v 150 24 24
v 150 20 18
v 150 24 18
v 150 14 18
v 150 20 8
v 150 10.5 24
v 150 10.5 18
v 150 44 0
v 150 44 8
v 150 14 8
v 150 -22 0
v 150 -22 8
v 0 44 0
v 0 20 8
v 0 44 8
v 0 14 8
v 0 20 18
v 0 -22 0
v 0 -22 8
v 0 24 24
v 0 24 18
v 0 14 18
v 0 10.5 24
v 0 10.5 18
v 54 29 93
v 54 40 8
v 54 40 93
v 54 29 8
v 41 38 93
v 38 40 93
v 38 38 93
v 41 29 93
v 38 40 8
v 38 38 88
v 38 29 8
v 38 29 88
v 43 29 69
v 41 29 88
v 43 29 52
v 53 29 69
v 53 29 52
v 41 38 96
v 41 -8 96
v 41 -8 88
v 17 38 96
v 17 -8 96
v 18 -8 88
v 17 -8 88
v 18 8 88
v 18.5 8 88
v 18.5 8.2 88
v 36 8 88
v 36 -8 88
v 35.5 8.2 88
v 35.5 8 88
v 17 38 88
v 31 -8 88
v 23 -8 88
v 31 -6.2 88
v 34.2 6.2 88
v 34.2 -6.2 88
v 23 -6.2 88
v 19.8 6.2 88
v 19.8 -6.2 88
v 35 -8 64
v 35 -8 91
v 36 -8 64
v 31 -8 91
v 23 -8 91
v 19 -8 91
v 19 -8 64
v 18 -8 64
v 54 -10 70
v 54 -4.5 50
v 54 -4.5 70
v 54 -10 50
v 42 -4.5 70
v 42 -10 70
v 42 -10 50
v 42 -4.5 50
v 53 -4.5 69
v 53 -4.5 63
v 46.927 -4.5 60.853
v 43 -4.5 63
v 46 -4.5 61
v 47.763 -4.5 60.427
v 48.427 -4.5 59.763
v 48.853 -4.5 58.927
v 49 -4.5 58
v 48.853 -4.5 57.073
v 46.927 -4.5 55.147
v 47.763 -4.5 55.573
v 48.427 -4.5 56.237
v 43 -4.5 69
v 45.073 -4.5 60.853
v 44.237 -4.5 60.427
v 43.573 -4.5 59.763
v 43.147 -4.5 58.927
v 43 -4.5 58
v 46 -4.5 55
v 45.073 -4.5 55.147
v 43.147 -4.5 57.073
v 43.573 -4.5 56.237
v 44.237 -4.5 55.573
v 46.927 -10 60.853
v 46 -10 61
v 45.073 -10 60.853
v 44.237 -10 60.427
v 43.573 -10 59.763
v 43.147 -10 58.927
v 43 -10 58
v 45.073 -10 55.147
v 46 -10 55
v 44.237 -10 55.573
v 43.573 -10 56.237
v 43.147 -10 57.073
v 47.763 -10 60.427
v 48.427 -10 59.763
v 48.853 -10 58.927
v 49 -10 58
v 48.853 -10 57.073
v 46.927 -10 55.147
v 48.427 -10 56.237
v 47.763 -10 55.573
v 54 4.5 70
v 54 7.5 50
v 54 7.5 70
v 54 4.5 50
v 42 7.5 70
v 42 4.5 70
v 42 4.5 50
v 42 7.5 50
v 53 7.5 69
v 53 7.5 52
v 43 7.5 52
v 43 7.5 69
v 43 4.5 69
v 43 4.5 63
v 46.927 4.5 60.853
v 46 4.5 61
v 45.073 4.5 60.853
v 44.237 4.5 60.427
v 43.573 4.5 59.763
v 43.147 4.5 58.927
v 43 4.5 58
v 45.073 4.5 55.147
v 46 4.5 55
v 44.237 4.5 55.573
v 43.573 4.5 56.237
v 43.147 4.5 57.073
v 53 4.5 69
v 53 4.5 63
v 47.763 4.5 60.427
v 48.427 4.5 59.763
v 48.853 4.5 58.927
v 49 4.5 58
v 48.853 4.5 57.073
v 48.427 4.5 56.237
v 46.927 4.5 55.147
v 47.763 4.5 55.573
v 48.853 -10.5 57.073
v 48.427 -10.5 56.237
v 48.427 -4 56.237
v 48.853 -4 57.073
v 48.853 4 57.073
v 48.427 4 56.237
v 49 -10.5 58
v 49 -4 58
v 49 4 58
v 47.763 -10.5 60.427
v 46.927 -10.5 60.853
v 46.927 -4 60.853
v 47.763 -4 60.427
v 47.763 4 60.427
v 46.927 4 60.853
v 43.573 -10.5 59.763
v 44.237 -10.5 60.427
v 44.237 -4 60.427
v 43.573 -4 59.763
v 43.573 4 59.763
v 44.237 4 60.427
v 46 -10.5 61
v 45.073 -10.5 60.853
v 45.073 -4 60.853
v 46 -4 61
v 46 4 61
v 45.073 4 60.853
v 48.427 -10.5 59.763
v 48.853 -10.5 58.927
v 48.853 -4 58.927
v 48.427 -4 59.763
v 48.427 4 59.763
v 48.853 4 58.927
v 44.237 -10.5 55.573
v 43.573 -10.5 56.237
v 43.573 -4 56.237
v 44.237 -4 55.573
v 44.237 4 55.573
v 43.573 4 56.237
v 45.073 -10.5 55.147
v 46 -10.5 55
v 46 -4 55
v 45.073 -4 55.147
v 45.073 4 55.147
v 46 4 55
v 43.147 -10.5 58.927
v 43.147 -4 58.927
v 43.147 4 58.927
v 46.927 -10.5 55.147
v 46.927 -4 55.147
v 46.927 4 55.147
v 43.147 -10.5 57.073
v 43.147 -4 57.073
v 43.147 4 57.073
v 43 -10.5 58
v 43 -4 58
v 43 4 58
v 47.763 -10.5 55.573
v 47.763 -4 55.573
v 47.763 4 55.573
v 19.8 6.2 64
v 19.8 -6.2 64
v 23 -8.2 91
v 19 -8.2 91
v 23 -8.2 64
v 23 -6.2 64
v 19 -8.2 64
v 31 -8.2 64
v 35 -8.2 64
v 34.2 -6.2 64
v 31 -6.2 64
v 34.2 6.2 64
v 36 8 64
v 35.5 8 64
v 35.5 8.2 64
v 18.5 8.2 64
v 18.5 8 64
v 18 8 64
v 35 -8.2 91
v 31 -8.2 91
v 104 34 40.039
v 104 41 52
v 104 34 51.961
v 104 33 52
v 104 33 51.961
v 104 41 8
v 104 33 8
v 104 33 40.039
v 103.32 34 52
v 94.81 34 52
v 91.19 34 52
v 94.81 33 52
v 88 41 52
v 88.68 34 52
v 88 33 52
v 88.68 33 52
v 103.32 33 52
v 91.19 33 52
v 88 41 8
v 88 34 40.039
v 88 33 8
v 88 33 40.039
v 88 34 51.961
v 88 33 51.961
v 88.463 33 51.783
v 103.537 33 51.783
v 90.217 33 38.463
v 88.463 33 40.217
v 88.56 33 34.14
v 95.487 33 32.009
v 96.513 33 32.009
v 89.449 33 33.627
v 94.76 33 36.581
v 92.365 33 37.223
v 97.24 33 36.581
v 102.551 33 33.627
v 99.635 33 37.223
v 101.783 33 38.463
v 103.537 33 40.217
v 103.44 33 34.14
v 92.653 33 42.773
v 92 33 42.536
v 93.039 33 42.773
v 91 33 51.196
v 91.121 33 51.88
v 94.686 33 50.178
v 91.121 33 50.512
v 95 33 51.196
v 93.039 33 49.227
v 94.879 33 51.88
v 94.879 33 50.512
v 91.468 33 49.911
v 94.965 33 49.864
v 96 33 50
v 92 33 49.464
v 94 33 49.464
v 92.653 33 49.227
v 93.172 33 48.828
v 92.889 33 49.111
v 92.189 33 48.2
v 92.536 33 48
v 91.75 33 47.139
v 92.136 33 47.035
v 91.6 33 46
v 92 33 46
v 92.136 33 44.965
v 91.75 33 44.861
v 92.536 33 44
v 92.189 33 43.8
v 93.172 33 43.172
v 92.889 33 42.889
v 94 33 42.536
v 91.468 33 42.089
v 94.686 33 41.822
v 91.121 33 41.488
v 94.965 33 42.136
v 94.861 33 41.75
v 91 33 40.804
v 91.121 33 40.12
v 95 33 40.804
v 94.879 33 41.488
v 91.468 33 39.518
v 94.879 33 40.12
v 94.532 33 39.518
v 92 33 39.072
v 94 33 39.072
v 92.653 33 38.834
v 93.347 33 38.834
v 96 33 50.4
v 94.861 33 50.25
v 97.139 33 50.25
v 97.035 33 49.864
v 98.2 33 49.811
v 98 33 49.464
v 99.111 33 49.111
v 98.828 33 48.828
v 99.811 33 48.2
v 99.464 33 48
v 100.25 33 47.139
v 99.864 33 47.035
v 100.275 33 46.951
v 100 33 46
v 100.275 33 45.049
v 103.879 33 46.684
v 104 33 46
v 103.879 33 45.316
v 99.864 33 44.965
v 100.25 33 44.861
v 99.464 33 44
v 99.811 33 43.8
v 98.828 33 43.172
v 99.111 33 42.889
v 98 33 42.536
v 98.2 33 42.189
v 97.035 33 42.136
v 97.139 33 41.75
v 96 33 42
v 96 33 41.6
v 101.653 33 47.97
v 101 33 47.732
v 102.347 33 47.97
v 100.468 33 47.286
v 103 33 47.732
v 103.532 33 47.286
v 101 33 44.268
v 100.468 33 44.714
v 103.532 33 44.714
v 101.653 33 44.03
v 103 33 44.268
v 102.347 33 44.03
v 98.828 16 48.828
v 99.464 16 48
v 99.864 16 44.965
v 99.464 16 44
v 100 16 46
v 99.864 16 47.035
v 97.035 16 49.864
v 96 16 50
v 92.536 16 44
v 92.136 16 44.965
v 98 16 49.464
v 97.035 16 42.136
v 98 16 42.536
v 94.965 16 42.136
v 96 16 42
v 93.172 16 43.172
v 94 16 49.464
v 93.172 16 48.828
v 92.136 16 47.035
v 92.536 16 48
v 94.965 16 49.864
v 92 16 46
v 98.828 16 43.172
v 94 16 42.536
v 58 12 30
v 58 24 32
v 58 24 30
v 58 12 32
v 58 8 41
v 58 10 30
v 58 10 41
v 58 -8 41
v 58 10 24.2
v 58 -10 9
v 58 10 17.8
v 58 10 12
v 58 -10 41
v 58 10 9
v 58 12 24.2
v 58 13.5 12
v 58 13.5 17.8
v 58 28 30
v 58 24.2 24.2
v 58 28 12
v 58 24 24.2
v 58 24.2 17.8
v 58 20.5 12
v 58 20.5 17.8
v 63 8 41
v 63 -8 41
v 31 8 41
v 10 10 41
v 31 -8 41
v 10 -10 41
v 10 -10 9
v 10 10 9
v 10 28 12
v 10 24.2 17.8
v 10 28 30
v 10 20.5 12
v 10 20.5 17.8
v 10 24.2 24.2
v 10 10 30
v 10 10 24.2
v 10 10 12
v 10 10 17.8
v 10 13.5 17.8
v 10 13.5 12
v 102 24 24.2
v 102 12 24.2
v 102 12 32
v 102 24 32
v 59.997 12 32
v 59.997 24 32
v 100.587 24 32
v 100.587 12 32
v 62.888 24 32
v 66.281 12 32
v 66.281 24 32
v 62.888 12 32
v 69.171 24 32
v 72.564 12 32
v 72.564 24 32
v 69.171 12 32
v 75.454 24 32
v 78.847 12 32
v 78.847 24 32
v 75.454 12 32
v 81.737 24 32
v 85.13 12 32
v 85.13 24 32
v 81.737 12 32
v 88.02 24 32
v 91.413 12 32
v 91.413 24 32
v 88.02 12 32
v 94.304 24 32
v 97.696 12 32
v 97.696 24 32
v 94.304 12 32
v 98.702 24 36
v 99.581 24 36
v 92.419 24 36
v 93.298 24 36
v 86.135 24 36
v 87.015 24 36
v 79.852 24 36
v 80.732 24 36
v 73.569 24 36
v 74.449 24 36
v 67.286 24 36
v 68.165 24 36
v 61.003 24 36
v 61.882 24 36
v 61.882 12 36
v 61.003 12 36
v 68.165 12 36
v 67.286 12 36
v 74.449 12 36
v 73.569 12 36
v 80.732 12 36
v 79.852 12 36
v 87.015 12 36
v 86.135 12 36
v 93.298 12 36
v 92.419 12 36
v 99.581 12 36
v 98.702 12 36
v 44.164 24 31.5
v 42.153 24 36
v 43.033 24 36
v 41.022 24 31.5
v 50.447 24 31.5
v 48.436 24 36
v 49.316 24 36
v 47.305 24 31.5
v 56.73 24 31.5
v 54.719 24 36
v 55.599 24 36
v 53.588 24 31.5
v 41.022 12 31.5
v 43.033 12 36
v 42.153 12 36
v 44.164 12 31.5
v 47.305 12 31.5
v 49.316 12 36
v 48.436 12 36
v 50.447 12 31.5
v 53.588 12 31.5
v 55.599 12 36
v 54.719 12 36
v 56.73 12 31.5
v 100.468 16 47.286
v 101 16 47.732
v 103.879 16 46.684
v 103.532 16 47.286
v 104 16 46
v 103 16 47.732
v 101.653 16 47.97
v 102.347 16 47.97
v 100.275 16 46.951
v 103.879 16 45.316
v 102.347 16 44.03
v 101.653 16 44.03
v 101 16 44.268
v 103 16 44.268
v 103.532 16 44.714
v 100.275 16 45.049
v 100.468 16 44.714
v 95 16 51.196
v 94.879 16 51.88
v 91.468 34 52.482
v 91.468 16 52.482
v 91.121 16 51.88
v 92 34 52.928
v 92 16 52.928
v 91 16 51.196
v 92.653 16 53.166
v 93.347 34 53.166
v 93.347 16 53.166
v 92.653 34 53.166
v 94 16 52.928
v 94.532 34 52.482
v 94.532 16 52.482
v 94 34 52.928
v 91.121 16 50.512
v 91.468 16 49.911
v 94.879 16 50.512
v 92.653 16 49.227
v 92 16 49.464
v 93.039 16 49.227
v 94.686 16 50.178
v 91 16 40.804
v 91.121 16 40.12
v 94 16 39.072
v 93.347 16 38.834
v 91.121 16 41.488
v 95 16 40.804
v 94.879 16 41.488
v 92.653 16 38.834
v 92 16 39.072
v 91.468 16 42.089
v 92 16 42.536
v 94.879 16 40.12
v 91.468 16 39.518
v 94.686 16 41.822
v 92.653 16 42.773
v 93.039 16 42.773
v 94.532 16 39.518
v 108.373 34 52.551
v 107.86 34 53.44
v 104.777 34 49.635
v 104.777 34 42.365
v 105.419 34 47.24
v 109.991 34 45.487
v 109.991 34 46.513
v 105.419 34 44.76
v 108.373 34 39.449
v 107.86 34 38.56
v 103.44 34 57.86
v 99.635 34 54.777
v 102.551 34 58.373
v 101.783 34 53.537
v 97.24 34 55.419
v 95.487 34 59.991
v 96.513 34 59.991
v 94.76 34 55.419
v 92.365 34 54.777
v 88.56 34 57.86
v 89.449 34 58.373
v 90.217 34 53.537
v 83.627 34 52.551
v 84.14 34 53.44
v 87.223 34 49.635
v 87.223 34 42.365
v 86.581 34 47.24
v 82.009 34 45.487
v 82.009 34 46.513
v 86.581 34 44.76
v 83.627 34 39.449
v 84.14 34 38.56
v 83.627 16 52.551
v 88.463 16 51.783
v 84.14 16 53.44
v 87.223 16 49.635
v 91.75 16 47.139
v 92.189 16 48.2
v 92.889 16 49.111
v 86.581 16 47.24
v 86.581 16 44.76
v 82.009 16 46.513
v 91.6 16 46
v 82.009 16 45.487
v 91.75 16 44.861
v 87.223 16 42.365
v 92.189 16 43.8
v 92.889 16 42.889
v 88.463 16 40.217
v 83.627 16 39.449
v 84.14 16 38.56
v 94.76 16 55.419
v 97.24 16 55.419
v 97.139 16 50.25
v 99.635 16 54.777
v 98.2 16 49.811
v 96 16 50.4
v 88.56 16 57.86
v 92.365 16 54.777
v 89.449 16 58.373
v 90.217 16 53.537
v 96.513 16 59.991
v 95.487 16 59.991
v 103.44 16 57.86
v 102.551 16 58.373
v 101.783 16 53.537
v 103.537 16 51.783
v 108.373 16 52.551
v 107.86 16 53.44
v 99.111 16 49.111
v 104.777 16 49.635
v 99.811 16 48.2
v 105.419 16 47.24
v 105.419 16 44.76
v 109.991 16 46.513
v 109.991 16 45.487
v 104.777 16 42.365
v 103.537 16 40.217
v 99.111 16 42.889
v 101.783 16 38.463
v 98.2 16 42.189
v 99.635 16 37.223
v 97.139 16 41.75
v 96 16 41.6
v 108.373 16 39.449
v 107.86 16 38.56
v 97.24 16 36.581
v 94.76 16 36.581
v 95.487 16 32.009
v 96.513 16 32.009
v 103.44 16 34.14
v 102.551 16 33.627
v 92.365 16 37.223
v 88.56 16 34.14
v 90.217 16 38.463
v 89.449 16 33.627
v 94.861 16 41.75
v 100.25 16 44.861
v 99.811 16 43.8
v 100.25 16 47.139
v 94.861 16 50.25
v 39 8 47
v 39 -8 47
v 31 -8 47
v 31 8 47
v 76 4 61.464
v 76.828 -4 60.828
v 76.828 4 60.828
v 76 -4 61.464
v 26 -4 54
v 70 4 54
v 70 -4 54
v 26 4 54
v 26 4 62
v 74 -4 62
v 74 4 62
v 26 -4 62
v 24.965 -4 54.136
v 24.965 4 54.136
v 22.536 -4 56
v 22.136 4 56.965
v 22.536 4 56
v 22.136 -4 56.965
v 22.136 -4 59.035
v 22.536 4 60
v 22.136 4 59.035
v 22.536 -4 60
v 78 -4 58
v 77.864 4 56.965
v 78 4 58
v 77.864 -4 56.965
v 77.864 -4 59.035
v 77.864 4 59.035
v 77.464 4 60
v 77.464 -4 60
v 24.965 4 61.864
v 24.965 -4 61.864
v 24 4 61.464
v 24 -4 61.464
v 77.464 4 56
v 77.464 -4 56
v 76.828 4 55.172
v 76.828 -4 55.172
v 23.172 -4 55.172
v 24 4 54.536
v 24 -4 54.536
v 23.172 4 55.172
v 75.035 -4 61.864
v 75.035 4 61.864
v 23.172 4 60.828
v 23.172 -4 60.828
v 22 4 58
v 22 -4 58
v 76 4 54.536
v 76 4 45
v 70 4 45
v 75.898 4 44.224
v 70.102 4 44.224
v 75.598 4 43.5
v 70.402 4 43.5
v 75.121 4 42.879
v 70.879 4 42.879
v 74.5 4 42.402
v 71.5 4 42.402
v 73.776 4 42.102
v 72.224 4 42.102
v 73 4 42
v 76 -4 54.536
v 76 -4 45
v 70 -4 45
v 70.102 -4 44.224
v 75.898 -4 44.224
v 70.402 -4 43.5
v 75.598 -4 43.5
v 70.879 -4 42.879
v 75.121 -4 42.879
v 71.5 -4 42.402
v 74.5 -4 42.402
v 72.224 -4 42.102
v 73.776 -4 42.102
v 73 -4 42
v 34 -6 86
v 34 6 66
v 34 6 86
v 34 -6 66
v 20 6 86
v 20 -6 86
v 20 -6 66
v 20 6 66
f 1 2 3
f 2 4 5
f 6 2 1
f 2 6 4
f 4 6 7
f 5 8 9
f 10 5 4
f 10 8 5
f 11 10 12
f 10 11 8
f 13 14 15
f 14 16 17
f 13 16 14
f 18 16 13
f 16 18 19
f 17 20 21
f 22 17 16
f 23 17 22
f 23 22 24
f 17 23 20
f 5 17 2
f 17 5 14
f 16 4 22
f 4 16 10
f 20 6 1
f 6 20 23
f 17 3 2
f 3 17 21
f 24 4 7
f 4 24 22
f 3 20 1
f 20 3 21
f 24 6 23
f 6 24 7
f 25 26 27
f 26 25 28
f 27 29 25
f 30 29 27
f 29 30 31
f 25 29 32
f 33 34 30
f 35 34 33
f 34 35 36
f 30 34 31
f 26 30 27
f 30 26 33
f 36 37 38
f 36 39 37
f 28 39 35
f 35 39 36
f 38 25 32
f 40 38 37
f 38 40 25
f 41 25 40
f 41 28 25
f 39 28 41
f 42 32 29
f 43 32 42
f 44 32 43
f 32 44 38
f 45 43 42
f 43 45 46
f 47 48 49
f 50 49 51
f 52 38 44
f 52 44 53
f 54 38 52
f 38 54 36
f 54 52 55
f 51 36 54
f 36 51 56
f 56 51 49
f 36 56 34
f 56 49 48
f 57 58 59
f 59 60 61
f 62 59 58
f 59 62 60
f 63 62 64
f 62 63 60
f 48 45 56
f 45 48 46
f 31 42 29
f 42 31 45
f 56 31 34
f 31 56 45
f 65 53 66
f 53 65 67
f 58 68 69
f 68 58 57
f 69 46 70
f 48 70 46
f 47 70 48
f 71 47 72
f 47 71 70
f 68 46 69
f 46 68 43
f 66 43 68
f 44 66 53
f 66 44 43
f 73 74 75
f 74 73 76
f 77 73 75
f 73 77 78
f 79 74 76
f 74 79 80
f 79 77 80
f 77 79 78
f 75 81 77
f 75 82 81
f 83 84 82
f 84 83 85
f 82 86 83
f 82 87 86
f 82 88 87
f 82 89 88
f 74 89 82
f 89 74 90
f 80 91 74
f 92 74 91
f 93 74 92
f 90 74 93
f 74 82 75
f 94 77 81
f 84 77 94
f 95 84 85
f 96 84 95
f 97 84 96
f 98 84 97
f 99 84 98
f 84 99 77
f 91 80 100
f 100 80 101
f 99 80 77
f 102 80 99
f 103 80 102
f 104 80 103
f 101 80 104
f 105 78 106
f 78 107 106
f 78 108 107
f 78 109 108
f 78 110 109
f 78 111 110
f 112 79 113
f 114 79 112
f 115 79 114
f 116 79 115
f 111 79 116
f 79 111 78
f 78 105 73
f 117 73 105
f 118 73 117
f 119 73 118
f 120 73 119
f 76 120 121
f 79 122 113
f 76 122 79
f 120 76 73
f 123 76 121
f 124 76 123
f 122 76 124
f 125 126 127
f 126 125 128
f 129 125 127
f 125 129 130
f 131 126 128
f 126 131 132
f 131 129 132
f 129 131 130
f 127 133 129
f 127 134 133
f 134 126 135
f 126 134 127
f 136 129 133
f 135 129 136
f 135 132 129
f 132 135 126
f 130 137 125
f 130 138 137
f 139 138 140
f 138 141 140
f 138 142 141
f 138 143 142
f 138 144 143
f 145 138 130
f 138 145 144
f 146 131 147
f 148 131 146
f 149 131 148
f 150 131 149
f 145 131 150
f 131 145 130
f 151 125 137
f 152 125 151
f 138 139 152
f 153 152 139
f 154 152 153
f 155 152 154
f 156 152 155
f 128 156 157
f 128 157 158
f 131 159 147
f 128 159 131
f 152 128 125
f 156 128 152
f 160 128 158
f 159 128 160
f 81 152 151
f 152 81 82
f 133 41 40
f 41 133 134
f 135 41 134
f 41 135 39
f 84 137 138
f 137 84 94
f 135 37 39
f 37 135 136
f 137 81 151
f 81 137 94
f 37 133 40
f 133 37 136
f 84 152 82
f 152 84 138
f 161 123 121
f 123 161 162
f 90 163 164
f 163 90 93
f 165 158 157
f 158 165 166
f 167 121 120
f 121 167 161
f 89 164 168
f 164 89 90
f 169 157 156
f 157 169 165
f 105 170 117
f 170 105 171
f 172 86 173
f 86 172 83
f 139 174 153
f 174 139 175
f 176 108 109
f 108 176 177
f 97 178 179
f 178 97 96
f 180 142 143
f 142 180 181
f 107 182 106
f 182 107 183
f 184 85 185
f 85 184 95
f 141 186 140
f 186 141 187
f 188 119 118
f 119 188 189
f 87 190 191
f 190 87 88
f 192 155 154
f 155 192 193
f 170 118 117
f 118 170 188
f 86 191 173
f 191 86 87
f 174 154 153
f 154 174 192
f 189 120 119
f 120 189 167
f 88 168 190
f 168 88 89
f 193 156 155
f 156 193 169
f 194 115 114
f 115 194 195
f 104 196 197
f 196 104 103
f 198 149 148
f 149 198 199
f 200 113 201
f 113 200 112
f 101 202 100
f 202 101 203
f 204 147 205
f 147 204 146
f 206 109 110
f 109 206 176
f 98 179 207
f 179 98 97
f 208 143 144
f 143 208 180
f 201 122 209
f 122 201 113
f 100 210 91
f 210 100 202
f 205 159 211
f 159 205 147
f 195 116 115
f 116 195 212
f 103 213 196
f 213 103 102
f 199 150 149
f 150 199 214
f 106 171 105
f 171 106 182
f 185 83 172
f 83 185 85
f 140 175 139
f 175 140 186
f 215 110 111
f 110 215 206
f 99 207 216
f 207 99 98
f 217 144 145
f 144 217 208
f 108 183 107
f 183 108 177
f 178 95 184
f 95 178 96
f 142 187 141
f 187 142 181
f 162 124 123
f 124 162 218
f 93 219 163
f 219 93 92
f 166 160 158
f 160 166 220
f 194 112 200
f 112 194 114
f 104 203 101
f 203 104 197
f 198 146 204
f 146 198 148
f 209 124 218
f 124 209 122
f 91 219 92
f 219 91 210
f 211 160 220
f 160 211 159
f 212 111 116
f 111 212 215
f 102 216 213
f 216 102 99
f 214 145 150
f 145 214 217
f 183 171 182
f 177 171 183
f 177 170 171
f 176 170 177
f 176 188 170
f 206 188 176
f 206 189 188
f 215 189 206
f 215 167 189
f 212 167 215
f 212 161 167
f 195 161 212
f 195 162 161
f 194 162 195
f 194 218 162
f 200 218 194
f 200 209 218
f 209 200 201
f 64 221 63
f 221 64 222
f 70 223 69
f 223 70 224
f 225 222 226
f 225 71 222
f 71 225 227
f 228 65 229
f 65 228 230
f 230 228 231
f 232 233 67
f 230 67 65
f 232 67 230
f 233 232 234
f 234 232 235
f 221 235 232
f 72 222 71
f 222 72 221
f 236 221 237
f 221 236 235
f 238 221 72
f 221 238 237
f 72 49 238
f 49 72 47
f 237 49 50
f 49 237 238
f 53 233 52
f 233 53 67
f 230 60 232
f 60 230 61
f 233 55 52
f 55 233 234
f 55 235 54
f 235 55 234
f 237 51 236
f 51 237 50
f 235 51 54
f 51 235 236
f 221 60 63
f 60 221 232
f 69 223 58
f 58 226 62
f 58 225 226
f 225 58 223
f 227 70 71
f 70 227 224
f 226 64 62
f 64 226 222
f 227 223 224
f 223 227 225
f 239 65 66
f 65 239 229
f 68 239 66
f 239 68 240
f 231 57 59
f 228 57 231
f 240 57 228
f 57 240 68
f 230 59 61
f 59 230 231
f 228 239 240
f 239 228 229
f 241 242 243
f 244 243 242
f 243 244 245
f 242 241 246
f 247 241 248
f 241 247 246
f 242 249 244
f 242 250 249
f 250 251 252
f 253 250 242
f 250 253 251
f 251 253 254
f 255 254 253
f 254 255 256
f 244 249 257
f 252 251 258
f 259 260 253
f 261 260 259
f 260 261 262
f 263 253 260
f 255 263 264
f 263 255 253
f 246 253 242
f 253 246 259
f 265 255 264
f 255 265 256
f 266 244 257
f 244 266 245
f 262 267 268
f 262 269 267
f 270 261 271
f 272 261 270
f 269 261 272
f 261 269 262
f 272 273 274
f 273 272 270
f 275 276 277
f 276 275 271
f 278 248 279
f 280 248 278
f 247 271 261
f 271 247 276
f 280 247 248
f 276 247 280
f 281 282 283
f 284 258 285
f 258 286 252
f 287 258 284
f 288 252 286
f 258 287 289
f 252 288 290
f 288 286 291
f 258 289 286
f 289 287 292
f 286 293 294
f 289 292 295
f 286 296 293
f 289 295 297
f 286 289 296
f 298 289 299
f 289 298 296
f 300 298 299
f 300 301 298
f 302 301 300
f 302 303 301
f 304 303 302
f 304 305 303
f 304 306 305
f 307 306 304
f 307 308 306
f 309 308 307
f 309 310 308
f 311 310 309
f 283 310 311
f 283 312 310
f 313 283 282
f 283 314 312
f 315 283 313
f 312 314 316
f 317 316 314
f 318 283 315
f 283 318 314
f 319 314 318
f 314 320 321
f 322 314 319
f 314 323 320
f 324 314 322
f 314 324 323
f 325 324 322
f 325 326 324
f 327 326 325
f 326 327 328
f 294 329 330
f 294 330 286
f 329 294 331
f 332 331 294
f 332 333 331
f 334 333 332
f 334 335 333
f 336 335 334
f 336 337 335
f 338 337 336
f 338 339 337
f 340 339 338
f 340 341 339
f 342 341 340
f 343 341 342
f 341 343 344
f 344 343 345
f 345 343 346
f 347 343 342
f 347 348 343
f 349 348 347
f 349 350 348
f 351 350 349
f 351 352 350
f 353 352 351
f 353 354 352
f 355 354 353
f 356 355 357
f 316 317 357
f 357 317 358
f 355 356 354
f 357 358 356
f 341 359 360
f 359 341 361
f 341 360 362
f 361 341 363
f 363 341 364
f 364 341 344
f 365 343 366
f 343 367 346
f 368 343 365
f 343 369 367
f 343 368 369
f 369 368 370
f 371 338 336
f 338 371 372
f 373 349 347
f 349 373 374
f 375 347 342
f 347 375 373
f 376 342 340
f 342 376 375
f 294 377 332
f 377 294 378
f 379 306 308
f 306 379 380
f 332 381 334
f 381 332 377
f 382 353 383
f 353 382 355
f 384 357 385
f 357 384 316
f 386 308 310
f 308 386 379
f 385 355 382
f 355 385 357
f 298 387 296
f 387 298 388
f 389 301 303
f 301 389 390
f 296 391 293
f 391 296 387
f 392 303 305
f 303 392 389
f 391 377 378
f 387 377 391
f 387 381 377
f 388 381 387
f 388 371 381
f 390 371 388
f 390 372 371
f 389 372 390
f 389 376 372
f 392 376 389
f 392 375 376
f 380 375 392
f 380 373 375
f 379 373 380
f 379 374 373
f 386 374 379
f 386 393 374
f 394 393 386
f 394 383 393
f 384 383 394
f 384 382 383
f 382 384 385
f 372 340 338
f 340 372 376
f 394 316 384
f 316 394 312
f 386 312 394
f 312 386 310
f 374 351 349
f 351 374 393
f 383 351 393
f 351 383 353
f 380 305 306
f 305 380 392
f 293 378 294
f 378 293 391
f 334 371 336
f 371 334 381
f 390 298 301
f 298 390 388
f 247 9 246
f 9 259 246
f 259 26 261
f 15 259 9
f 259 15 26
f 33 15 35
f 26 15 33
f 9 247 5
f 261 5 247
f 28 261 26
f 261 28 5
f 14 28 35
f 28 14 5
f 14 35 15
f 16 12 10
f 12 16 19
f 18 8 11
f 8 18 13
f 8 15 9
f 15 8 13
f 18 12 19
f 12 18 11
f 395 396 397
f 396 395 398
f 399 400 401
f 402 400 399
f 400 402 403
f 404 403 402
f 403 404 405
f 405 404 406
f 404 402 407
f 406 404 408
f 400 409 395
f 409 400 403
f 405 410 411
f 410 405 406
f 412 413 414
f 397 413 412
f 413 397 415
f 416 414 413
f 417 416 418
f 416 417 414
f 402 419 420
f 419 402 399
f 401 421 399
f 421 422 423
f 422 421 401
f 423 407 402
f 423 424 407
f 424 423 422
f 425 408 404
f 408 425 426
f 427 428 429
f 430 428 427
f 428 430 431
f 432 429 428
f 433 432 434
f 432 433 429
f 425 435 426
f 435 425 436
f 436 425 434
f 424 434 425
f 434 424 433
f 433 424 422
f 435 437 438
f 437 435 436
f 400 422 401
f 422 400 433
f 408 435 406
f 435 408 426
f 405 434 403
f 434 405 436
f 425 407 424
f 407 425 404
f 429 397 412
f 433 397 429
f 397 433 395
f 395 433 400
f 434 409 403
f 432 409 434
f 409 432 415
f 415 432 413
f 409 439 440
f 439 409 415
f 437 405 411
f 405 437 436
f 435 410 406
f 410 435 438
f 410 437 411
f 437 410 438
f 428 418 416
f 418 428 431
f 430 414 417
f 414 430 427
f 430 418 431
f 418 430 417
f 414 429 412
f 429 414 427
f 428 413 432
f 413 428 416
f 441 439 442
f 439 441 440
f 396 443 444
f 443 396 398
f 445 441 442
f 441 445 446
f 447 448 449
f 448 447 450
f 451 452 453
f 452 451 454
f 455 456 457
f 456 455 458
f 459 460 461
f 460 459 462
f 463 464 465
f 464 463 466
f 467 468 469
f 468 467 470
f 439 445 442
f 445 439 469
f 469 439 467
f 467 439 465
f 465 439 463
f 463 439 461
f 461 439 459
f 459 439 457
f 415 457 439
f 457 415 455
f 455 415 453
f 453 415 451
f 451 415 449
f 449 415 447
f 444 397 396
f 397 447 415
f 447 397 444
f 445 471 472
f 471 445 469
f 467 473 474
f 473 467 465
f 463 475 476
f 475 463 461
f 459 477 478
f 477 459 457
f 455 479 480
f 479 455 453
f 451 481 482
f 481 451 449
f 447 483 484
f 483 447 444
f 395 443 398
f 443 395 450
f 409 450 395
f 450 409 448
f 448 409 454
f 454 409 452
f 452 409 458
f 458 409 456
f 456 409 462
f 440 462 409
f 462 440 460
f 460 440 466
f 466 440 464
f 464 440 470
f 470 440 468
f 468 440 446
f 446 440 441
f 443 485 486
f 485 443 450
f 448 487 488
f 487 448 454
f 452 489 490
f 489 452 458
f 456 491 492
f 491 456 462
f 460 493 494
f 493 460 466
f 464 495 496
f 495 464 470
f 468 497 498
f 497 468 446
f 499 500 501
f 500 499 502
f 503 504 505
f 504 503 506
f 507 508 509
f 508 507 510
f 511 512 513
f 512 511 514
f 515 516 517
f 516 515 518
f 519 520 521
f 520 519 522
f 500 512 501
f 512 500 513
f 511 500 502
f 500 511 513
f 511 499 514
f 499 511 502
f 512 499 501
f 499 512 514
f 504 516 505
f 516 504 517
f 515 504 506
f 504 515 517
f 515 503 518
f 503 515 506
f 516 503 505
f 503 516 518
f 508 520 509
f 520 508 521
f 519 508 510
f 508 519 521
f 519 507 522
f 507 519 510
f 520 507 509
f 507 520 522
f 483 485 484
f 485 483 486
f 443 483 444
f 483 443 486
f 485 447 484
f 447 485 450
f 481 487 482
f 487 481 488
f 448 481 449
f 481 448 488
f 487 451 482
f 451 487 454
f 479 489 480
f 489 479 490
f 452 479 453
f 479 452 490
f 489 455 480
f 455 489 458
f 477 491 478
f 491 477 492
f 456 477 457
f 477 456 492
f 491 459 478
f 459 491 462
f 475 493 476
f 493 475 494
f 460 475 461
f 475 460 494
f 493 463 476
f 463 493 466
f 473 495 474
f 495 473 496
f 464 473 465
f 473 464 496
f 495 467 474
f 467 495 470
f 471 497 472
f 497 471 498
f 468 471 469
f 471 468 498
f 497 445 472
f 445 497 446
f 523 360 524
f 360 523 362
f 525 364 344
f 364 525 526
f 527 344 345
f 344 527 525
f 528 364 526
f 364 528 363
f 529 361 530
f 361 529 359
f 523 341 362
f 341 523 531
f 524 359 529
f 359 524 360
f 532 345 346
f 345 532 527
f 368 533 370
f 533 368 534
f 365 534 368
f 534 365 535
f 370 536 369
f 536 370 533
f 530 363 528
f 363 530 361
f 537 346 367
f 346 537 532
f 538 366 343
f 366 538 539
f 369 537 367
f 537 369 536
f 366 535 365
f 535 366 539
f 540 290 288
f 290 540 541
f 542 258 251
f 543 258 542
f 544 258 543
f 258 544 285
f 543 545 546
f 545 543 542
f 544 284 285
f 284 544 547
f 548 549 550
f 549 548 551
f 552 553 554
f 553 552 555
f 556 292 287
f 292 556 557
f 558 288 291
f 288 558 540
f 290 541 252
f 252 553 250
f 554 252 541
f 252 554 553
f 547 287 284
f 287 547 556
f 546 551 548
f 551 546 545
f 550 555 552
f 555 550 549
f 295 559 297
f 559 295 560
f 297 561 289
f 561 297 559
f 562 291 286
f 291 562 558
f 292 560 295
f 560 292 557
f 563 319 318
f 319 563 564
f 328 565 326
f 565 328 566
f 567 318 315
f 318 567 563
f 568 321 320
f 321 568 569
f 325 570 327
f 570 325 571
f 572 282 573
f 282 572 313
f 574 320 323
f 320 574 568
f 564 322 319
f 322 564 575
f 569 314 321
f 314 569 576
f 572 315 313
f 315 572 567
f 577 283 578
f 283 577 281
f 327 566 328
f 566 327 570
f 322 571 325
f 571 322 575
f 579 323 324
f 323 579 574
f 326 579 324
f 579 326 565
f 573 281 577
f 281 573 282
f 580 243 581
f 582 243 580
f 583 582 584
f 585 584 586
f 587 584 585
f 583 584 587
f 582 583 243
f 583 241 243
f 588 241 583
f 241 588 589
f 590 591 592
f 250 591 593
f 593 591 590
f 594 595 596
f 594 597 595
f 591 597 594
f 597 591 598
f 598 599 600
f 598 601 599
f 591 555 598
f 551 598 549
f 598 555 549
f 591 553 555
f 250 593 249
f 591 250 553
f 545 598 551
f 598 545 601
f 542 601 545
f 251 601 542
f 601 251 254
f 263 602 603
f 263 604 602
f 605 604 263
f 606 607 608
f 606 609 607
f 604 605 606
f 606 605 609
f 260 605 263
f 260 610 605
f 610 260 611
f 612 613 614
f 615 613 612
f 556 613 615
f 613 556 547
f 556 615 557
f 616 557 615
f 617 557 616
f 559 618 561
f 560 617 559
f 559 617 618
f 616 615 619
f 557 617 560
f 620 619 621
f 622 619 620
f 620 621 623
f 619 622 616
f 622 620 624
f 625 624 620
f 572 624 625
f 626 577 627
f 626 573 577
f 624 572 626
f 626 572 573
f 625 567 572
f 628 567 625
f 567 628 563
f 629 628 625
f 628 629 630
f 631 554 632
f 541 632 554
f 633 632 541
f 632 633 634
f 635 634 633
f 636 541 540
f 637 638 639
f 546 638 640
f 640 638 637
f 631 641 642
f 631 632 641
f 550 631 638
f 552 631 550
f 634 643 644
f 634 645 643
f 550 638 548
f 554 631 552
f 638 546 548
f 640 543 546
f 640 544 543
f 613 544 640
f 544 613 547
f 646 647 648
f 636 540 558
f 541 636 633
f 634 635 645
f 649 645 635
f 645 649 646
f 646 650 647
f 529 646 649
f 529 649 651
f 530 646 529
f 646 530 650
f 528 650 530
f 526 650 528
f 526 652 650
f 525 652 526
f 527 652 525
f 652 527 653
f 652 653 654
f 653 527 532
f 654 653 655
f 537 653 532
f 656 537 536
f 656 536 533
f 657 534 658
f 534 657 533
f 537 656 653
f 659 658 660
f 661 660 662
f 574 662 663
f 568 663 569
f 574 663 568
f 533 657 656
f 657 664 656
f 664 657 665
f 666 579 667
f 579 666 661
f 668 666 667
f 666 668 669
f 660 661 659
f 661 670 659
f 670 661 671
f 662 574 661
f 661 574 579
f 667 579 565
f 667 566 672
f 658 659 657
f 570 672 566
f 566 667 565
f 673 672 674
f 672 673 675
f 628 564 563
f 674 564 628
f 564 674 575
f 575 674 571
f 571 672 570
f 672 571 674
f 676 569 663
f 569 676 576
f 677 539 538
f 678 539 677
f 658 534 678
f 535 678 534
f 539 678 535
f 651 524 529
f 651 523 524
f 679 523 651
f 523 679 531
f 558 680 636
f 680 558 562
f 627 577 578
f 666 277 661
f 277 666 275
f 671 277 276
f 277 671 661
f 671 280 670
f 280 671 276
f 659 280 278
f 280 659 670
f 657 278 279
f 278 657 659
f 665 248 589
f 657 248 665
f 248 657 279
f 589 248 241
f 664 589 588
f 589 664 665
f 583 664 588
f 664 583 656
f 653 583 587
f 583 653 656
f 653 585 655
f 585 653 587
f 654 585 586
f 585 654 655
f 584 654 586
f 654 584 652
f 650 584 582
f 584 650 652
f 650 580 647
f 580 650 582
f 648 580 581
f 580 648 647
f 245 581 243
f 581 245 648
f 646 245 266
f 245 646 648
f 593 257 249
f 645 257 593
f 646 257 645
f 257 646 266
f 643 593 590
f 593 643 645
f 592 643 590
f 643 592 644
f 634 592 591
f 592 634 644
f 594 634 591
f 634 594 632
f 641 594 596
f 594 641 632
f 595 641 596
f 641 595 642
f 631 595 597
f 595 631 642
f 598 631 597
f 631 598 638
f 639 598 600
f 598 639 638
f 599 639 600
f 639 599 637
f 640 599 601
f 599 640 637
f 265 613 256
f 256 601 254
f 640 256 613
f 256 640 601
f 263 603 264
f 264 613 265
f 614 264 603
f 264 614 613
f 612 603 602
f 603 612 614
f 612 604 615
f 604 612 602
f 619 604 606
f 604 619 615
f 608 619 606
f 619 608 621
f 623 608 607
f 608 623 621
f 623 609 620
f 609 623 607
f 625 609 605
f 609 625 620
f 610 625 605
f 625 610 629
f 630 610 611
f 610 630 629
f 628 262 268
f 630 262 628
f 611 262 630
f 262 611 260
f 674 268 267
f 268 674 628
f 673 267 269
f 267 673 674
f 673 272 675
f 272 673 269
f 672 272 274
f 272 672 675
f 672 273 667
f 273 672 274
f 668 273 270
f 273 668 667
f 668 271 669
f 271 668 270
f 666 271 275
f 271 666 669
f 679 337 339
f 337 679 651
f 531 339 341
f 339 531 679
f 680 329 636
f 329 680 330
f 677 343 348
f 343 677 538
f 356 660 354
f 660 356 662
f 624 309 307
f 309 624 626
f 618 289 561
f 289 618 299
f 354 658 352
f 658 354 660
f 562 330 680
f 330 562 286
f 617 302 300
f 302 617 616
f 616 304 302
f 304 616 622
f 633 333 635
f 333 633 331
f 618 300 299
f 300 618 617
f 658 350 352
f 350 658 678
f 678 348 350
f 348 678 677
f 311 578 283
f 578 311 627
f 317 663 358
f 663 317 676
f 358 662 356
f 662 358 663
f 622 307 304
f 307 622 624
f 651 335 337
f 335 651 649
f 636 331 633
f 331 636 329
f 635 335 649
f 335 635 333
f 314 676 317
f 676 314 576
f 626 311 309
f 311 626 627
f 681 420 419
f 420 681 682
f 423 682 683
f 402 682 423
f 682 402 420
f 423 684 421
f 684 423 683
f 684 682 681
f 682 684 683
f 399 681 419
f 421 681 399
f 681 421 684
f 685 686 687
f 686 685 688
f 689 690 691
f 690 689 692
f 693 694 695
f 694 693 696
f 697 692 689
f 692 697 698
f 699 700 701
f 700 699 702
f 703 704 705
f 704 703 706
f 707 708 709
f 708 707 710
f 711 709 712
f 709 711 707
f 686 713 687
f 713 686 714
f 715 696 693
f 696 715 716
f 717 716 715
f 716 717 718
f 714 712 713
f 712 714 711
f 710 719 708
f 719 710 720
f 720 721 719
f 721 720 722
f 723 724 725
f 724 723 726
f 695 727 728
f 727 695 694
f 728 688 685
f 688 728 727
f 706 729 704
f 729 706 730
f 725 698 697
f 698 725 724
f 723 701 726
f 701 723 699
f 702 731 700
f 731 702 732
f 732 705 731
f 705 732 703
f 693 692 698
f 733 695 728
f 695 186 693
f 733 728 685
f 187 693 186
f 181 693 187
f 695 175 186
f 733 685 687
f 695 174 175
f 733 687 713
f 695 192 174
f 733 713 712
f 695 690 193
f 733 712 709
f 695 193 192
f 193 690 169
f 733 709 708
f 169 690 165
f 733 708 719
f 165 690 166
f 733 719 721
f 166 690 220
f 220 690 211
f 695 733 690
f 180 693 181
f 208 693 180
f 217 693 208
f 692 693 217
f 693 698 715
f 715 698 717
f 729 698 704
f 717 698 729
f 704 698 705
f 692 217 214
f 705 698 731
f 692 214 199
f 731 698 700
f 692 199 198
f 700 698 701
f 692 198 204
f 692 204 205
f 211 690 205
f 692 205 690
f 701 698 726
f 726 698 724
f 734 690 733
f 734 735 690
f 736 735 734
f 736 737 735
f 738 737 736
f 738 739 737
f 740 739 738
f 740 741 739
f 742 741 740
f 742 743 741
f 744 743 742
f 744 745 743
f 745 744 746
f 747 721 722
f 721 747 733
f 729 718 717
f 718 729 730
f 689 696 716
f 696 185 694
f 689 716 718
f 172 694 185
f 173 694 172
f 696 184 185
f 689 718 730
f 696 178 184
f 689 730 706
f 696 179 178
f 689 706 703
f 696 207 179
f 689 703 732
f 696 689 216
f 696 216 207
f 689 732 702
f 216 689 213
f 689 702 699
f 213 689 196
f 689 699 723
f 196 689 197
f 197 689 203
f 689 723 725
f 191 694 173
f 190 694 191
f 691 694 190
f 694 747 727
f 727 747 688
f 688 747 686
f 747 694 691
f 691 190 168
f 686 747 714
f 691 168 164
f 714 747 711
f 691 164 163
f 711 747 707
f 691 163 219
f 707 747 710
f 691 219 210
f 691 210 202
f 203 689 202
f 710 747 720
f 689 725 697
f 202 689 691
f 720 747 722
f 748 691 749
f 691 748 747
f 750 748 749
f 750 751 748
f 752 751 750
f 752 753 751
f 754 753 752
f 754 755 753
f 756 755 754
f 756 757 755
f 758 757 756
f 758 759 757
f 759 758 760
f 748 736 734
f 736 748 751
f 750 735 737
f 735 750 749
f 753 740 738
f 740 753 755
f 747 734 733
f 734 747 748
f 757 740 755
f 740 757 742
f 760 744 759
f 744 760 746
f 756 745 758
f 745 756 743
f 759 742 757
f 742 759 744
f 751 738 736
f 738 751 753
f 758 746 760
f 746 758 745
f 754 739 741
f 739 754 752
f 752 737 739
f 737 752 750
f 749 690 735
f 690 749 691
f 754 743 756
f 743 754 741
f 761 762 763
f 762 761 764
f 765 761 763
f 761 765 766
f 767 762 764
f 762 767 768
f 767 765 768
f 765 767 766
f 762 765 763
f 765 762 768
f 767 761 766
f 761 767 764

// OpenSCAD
// A gate, a spring latch, and a drive that cannot open it.
//
// This is the whole argument in one model. The gate is driven to a position by
// a servo with a force ceiling, four times over: shut it, open it, give up,
// and — once the latch has been released — open it. The second of those is the
// interesting one. Nothing here says "the gate is locked". The hook drops
// behind the catch because it is heavy and sprung, the catch runs into it
// because it is in the way, and the drive fails to reach the number it was
// given because a bounded force cannot beat a hinge stop.
//
// A drive that could always reach its target would teleport the gate through
// the hook, and the animation would look fine and be a lie.
//
// The pawl is two parts bolted together rather than one, and the reason is the
// collider. Drawn as a single L, its convex hull is the *triangle* between the
// arm and the hook — which fills in exactly the gap the catch has to pass
// through, and the check duly reported it fouling before anything moved. An arm
// and a hook are each convex on their own. `collider = "decompose"` would also
// work and costs a voxel of accuracy; two parts and a weld cost nothing.
//
// Also here: a rack and pinion used as a *readout*, the gate turning the pinion
// rather than the other way about — the same constraint read from the far end.
//
// Every joint in it is built as well as declared, and that took more metal than
// the mechanism itself. Four of the seven were sentences and nothing else: an
// arm hinged to a post 14 mm away from it, a plunger on a slider with no guide
// within 14 mm, a pinion 9 mm off its own shaft, and a rack and pinion 50 mm
// apart with no teeth on either. All four simulated perfectly, because a mate
// both supplies the constraint and excludes the pair from every check that
// could have noticed there was nothing there.

module part(name, fixed = false, density = undef, mass = undef,
            collider = undef, friction = undef, bounce = undef) { children(); }
module hinge(name, parts, at, axis, range) { }
module slider(name, parts, at, axis, range) { }
module rack(name, parts, at, axis, rack_axis, radius) { }
module weld(name, parts, at, axis) { }
module drive(name, to, over, at, torque, speed) { }

STEEL   = 0.0078;
PLASTIC = 0.0012;
PIN     = [0, 1, 0];

DECK     = 8;
GATE_Z   = 9;                 // riding just clear of the deck
GATE_TOP = 41;
// Six millimetres proud, not ten. The hook rides over the catch and then falls
// off the back of it, and what it falls is what it arrives with: a ten
// millimetre drop landed it five millimetres deep in the catch, a six
// millimetre one lands it a fraction of that. Six is still more bite than the
// gate can ever pull through.
CATCH_TOP = 47;
TRAVEL   = 48;                // how far the gate has to go to be shut

// Where the catch's back face is drawn. It has to end up *past* the hook when
// the gate is shut, or the hook rides on top of the catch instead of dropping
// in behind it — which is not a latch, and which shows up as the hook being
// crushed into the catch rather than sitting beside it.
REAR = 31;
RAMP = 24;                    // 6 up over 24 along: about 14°

PIVOT = [46, 0, 58];          // the pawl swings here
ARM_A = [26, 0, 58];          // tail end, where the release pushes down
ARM_B = [74, 0, 58];          // nose end, where the hook hangs
HOOK  = [73, 0, 45];          // and the bottom of the hook
PINION = [96, 0, 46];         // the readout shaft
PLUNGE = [27, 0, 66];         // and the release plunger's axis

// Everything structural stands *behind* the machine and reaches forward over the
// top of it. The two posts used to be in front, at y = -26, which is the side
// the tour's camera sits on: a pair of grey columns across the one thing the
// model is about. Behind is +y here, as it is in every model in the tour.
//
// And it is one post, not two, carrying one bar the width of the plunger it
// holds. Built as a portal — two columns and a beam across their tops — it was
// structurally excellent and a grey wall through the middle of the picture. The
// release has to be supported from behind, because the gate sweeps through every
// square millimetre of deck under it, but only what the plunger needs has to
// come forward with it.
BACK   = [30, 40];            // the post's near and far faces in y
BEAM_Z = 90;                  // the cantilever the release hangs from

module bar(p, q, r, t) {
    hull() {
        translate(p) rotate([-90, 0, 0]) cylinder(h = t, r = r, $fn = 24, center = true);
        translate(q) rotate([-90, 0, 0]) cylinder(h = t, r = r, $fn = 24, center = true);
    }
}

// ---- the frame ------------------------------------------------------------
// The deck, the rail the gate runs on, two columns, the beam across their tops,
// and — hanging from that beam — the pawl's yoke and the plunger's guide.
//
// The rail is a stalk with a head on it, and the gate wraps that head. A gate
// drawn as a block resting on a flat deck is held up by gravity and held on its
// line by the slider() mate, which is to say by a sentence.
STALK = [14, 20];             // the rail stalk's faces in y
HEAD  = [10.5, 24];           // the head overhangs it both ways
// No two of the twenty-odd solids below share a face. Every one of them
// overlaps its neighbour by a millimetre or sinks a millimetre into the deck,
// and none of that is tidiness: exactly coplanar touching faces are the worst
// case an exact boolean kernel has, and this frame is where that stopped being
// a footnote. Butted together the way they were first drawn — post on deck, bar
// on post, web between two prongs, shaft ending flush in its boss — the union
// came out as 49,224 triangles and took 2.6 seconds to evaluate, because every
// coincident pair splits both faces along the other's edges and the splits
// compound. Given a millimetre each it is 3,000 triangles and 40 milliseconds.
//
// Sixty times faster and sixteen times smaller, for a millimetre nobody can see.
part("frame", fixed = true)
    color("slategray") {
        translate([0, -22, 0]) cube([150, BACK[1] + 26, DECK]);

        color("dimgray") {
            // the gate's rail: a stalk sunk into the deck, and a head over it
            translate([0, STALK[0], DECK - 1]) cube([150, STALK[1] - STALK[0], 12]);
            translate([0, HEAD[0], 18]) cube([150, HEAD[1] - HEAD[0], 6]);

            // one post, and the bar it cantilevers forward over the release
            translate([38, BACK[0] - 1, DECK - 1])
                cube([16, BACK[1] - BACK[0] + 1, BEAM_Z + 4 - DECK]);
            translate([17, -8, BEAM_Z - 2]) cube([24, BACK[1] + 6, 8]);

            // The pawl's yoke: two prongs down either side of the arm, a web
            // back to the post and a bridge over the top tying them together.
            // They start above the catch, which sweeps through at z 41..47 — the
            // arm is mated to this part and so passes through it unchallenged,
            // but the catch is not and would be caught.
            translate([42, -10, 50]) cube([12, 5.5, 20]);
            translate([42, 4.5, 50]) cube([12, 3, 20]);
            translate([43, 6, 52]) cube([10, BACK[0] - 5, 13]);
            translate([43, -9, 63]) cube([10, BACK[0] + 11, 6]);
            translate([PIVOT[0], -10.5, PIVOT[2]]) rotate([-90, 0, 0])
                cylinder(h = 18.5, r = 3, $fn = 20);

            // The plunger's guide: a yoke it runs in, hanging from that bar,
            // because there is nowhere on the deck to stand one — the gate
            // sweeps through all of it. Open down the middle at the front so
            // you can watch the plunger, gibbed at the corners so it is still a
            // guide: over, under and either side is what makes one.
            translate([18, -8, 64]) cube([1.8, 16, BEAM_Z - 63]);
            translate([34.2, -8, 64]) cube([1.8, 16, BEAM_Z - 63]);
            translate([18.5, 6.2, 64]) cube([17, 2, BEAM_Z - 63]);
            translate([19, -8.2, 64]) cube([4, 2, BEAM_Z - 63]);
            translate([31, -8.2, 64]) cube([4, 2, BEAM_Z - 63]);

            // the pinion's post, and its shaft ending inside it rather than
            // flush with its back face
            translate([88, BACK[0] + 3, DECK - 1]) cube([16, 8, PINION[2] - DECK + 7]);
            translate([PINION[0], 16, PINION[2]]) rotate([-90, 0, 0])
                cylinder(h = BACK[1] - 18, r = 4, $fn = 24);
        }
    }

// ---- the gate, and the things bolted to it --------------------------------
// The body, the wrap that holds it on the rail, and the arm carrying its rack.
RACK_M  = 2;                                   // the readout's tooth size
RACK_P  = 3.14159265 * RACK_M;                 // so, its pitch: 6.283
RACK_R  = 12;                                  // the pinion's pitch radius
RACK_Z  = PINION[2] - RACK_R;                  // and the rack's pitch line
// The pinion has a tooth pointing straight down — twelve teeth is one every 30°,
// and 270 is a multiple of 30 — so the rack has to meet it with a gap. Half a
// pitch off a tooth centre is a gap centre, and this is where it has to land.
RACK_X0 = PINION[0] - 8.5 * RACK_P;
RACK_N  = 10;

module rack_teeth(n, m, x0, z0) {
    p = 3.14159265 * m;
    for (i = [0 : n - 1])
        polygon([[x0 + (i - 0.25) * p, z0 - 1.25 * m],
                 [x0 + (i - 0.07) * p, z0 + m],
                 [x0 + (i + 0.07) * p, z0 + m],
                 [x0 + (i + 0.25) * p, z0 - 1.25 * m]]);
}

part("gate", density = PLASTIC, friction = 0.2)
    color("steelblue") {
        translate([10, -10, GATE_Z]) cube([48, 20, GATE_TOP - GATE_Z]);
        // the wrap: over the head, under it either side of the stalk, and the
        // wall down the back tying the two together
        translate([10, 8, 24.2]) cube([48, 18, 5.8]);
        translate([10, 8, 12]) cube([48, 5.5, 5.8]);
        translate([10, 20.5, 12]) cube([48, 5.5, 5.8]);
        translate([10, 24.2, 12]) cube([48, 3.8, 18]);
        // The rack arm, reaching back over the rail to the pinion and staying
        // under it through the whole travel — 48 mm of it. A rack that only
        // meets its pinion at one end of the stroke is a rack for that instant.
        translate([58, 12, 24.2]) cube([44, 12, 7.8]);
        color("cadetblue")
            translate([0, 24, 0]) rotate([90, 0, 0])
                linear_extrude(height = 12)
                    rack_teeth(RACK_N, RACK_M, RACK_X0, RACK_Z);
    }
slider("travel", parts = ["gate", "frame"], at = [10, 17, 21],
       axis = [1, 0, 0], range = [0, TRAVEL]);

// A ramp the hook can ride up and a face it cannot. Drawn as its cross-section
// and extruded across the gate, which is how you would cut it.
//
// The ramp rises 6 over 24, which is 14°. At 45° — ten over ten, which is what
// this was — lifting the pawl costs as much force sideways as it does upwards,
// and the gate has to shove that hard through a single line of contact. The
// hook buried itself 1.1 mm in the catch every time it climbed. A latch ramp is
// shallow for exactly this reason, and it is the same reason a wedge works.
part("catch", density = STEEL, friction = 0.15)
    color("orangered")
        translate([0, 8, 0]) rotate([90, 0, 0])
            linear_extrude(height = 16)
                polygon([[REAR + 8 + RAMP, GATE_TOP], [REAR + 8, CATCH_TOP],
                         [REAR, CATCH_TOP], [REAR, GATE_TOP]]);
weld("catch_bolts", parts = ["catch", "gate"], at = [40, 0, 46], axis = [0, 0, 1]);

// ---- the latch ------------------------------------------------------------
// One straight bar through the pivot: nose end to the right, tail to the left
// for the release to push on. It stays clear above the catch for its whole
// length, which is the point of drawing it this way. It hangs on the frame's
// pin, between the frame's two prongs.
part("arm", density = STEEL, friction = 0.25, bounce = 0)
    color("goldenrod") bar(ARM_A, ARM_B, 4, 8);
// Lifting is negative, and the pawl may not drop below where it is drawn. That
// stop is what the catch pushes against when the gate tries to leave.
hinge("pawl_pivot", parts = ["arm", "frame"], at = PIVOT, axis = PIN,
      range = [-30, 0]);
// The spring: enough to drop the hook back down, not enough to stop a ramp
// lifting it.
drive("pawl_pivot", to = 0, over = 0.2, at = 0, torque = 1400000);

part("hook", density = STEEL, friction = 0.25, bounce = 0)
    color("darkgoldenrod") bar([ARM_B[0] - 1, 0, ARM_B[2]], HOOK, 3, 8);
weld("hook_bolts", parts = ["hook", "arm"], at = ARM_B, axis = [0, 0, 1]);

// ---- the release actuator -------------------------------------------------
// Pushes *down* on the tail, which lifts the nose. A lever is the cheapest way
// to turn a plunger you can put somewhere into a motion you need elsewhere.
part("plunger", density = STEEL, friction = 0.2)
    color("orchid") translate([20, -6, 66]) cube([14, 12, 20]);
slider("release", parts = ["plunger", "frame"], at = PLUNGE,
       axis = [0, 0, 1], range = [-14, 2]);

// ---- a rack and pinion, read backwards ------------------------------------
// Teeth, because a readout drawn as a smooth disc near a smooth block is a
// readout of nothing. The bore is real too: the frame's shaft runs through it.
module wheel(n, m, h) {
    difference() {
        linear_extrude(height = h)
            polygon(points = [for (i = [0 : n - 1]) each
                let (p = 360 / n, r = m * n / 2, tip = r + m, root = r - 1.25 * m) [
                    [root * cos((i - 0.25) * p), root * sin((i - 0.25) * p)],
                    [tip  * cos((i - 0.07) * p), tip  * sin((i - 0.07) * p)],
                    [tip  * cos((i + 0.07) * p), tip  * sin((i + 0.07) * p)],
                    [root * cos((i + 0.25) * p), root * sin((i + 0.25) * p)],
                ]]);
        translate([0, 0, -1]) cylinder(h = h + 2, r = 4.4, $fn = 24);
        for (i = [0 : 2])
            rotate([0, 0, i * 120])
                translate([m * n / 4, 0, -1]) cylinder(h = h + 2, r = m, $fn = 18);
    }
}
part("pinion", density = STEEL)
    color("indianred")
        translate([PINION[0], 34, PINION[2]]) rotate([90, 0, 0])
            wheel(RACK_R * 2 / RACK_M, RACK_M, 18);
hinge("pinion_shaft", parts = ["pinion", "frame"], at = PINION, axis = PIN);
rack("readout", parts = ["pinion", "gate"], at = PINION,
     axis = [0, 1, 0], rack_axis = [1, 0, 0], radius = RACK_R);

// ---- what it is told to do ------------------------------------------------
// Four moves on one mate. They queue: each starts from wherever the one in
// front actually got to, which is not always where it was aimed.
drive("travel", to = TRAVEL, over = 1.1, at = 0.3, torque = 700000);   // shut it
drive("travel", to = 0,      over = 1.0, at = 2.2, torque = 700000);   // open it
drive("travel", to = TRAVEL, over = 0.3, at = 3.3, torque = 700000);   // give up
drive("travel", to = 0,      over = 1.2, at = 4.6, torque = 700000);   // now open it

// Firm, and slow. Firm because a plunger that cannot hold the pawl up against
// its spring bounces on and off it, hammering the hinge dozens of times instead
// of once. Slow because the arrival is what shakes the joint: a revolute joint
// carrying a load has real angular compliance, and taking 0.8 s over this move
// rather than 0.5 took the axis read back out of the geometry from 1.7° off the
// declared one to inside the check's tolerance. The verification is sensitive to
// exactly the thing a machine designer would also care about.
drive("release", to = 0,   over = 0.1, at = 0.0, torque = 1400000);     // held up
drive("release", to = -10, over = 0.8, at = 3.7, torque = 1400000);     // lift the pawl
drive("release", to = 0,   over = 0.4, at = 6.0, torque = 1400000);     // let it drop
